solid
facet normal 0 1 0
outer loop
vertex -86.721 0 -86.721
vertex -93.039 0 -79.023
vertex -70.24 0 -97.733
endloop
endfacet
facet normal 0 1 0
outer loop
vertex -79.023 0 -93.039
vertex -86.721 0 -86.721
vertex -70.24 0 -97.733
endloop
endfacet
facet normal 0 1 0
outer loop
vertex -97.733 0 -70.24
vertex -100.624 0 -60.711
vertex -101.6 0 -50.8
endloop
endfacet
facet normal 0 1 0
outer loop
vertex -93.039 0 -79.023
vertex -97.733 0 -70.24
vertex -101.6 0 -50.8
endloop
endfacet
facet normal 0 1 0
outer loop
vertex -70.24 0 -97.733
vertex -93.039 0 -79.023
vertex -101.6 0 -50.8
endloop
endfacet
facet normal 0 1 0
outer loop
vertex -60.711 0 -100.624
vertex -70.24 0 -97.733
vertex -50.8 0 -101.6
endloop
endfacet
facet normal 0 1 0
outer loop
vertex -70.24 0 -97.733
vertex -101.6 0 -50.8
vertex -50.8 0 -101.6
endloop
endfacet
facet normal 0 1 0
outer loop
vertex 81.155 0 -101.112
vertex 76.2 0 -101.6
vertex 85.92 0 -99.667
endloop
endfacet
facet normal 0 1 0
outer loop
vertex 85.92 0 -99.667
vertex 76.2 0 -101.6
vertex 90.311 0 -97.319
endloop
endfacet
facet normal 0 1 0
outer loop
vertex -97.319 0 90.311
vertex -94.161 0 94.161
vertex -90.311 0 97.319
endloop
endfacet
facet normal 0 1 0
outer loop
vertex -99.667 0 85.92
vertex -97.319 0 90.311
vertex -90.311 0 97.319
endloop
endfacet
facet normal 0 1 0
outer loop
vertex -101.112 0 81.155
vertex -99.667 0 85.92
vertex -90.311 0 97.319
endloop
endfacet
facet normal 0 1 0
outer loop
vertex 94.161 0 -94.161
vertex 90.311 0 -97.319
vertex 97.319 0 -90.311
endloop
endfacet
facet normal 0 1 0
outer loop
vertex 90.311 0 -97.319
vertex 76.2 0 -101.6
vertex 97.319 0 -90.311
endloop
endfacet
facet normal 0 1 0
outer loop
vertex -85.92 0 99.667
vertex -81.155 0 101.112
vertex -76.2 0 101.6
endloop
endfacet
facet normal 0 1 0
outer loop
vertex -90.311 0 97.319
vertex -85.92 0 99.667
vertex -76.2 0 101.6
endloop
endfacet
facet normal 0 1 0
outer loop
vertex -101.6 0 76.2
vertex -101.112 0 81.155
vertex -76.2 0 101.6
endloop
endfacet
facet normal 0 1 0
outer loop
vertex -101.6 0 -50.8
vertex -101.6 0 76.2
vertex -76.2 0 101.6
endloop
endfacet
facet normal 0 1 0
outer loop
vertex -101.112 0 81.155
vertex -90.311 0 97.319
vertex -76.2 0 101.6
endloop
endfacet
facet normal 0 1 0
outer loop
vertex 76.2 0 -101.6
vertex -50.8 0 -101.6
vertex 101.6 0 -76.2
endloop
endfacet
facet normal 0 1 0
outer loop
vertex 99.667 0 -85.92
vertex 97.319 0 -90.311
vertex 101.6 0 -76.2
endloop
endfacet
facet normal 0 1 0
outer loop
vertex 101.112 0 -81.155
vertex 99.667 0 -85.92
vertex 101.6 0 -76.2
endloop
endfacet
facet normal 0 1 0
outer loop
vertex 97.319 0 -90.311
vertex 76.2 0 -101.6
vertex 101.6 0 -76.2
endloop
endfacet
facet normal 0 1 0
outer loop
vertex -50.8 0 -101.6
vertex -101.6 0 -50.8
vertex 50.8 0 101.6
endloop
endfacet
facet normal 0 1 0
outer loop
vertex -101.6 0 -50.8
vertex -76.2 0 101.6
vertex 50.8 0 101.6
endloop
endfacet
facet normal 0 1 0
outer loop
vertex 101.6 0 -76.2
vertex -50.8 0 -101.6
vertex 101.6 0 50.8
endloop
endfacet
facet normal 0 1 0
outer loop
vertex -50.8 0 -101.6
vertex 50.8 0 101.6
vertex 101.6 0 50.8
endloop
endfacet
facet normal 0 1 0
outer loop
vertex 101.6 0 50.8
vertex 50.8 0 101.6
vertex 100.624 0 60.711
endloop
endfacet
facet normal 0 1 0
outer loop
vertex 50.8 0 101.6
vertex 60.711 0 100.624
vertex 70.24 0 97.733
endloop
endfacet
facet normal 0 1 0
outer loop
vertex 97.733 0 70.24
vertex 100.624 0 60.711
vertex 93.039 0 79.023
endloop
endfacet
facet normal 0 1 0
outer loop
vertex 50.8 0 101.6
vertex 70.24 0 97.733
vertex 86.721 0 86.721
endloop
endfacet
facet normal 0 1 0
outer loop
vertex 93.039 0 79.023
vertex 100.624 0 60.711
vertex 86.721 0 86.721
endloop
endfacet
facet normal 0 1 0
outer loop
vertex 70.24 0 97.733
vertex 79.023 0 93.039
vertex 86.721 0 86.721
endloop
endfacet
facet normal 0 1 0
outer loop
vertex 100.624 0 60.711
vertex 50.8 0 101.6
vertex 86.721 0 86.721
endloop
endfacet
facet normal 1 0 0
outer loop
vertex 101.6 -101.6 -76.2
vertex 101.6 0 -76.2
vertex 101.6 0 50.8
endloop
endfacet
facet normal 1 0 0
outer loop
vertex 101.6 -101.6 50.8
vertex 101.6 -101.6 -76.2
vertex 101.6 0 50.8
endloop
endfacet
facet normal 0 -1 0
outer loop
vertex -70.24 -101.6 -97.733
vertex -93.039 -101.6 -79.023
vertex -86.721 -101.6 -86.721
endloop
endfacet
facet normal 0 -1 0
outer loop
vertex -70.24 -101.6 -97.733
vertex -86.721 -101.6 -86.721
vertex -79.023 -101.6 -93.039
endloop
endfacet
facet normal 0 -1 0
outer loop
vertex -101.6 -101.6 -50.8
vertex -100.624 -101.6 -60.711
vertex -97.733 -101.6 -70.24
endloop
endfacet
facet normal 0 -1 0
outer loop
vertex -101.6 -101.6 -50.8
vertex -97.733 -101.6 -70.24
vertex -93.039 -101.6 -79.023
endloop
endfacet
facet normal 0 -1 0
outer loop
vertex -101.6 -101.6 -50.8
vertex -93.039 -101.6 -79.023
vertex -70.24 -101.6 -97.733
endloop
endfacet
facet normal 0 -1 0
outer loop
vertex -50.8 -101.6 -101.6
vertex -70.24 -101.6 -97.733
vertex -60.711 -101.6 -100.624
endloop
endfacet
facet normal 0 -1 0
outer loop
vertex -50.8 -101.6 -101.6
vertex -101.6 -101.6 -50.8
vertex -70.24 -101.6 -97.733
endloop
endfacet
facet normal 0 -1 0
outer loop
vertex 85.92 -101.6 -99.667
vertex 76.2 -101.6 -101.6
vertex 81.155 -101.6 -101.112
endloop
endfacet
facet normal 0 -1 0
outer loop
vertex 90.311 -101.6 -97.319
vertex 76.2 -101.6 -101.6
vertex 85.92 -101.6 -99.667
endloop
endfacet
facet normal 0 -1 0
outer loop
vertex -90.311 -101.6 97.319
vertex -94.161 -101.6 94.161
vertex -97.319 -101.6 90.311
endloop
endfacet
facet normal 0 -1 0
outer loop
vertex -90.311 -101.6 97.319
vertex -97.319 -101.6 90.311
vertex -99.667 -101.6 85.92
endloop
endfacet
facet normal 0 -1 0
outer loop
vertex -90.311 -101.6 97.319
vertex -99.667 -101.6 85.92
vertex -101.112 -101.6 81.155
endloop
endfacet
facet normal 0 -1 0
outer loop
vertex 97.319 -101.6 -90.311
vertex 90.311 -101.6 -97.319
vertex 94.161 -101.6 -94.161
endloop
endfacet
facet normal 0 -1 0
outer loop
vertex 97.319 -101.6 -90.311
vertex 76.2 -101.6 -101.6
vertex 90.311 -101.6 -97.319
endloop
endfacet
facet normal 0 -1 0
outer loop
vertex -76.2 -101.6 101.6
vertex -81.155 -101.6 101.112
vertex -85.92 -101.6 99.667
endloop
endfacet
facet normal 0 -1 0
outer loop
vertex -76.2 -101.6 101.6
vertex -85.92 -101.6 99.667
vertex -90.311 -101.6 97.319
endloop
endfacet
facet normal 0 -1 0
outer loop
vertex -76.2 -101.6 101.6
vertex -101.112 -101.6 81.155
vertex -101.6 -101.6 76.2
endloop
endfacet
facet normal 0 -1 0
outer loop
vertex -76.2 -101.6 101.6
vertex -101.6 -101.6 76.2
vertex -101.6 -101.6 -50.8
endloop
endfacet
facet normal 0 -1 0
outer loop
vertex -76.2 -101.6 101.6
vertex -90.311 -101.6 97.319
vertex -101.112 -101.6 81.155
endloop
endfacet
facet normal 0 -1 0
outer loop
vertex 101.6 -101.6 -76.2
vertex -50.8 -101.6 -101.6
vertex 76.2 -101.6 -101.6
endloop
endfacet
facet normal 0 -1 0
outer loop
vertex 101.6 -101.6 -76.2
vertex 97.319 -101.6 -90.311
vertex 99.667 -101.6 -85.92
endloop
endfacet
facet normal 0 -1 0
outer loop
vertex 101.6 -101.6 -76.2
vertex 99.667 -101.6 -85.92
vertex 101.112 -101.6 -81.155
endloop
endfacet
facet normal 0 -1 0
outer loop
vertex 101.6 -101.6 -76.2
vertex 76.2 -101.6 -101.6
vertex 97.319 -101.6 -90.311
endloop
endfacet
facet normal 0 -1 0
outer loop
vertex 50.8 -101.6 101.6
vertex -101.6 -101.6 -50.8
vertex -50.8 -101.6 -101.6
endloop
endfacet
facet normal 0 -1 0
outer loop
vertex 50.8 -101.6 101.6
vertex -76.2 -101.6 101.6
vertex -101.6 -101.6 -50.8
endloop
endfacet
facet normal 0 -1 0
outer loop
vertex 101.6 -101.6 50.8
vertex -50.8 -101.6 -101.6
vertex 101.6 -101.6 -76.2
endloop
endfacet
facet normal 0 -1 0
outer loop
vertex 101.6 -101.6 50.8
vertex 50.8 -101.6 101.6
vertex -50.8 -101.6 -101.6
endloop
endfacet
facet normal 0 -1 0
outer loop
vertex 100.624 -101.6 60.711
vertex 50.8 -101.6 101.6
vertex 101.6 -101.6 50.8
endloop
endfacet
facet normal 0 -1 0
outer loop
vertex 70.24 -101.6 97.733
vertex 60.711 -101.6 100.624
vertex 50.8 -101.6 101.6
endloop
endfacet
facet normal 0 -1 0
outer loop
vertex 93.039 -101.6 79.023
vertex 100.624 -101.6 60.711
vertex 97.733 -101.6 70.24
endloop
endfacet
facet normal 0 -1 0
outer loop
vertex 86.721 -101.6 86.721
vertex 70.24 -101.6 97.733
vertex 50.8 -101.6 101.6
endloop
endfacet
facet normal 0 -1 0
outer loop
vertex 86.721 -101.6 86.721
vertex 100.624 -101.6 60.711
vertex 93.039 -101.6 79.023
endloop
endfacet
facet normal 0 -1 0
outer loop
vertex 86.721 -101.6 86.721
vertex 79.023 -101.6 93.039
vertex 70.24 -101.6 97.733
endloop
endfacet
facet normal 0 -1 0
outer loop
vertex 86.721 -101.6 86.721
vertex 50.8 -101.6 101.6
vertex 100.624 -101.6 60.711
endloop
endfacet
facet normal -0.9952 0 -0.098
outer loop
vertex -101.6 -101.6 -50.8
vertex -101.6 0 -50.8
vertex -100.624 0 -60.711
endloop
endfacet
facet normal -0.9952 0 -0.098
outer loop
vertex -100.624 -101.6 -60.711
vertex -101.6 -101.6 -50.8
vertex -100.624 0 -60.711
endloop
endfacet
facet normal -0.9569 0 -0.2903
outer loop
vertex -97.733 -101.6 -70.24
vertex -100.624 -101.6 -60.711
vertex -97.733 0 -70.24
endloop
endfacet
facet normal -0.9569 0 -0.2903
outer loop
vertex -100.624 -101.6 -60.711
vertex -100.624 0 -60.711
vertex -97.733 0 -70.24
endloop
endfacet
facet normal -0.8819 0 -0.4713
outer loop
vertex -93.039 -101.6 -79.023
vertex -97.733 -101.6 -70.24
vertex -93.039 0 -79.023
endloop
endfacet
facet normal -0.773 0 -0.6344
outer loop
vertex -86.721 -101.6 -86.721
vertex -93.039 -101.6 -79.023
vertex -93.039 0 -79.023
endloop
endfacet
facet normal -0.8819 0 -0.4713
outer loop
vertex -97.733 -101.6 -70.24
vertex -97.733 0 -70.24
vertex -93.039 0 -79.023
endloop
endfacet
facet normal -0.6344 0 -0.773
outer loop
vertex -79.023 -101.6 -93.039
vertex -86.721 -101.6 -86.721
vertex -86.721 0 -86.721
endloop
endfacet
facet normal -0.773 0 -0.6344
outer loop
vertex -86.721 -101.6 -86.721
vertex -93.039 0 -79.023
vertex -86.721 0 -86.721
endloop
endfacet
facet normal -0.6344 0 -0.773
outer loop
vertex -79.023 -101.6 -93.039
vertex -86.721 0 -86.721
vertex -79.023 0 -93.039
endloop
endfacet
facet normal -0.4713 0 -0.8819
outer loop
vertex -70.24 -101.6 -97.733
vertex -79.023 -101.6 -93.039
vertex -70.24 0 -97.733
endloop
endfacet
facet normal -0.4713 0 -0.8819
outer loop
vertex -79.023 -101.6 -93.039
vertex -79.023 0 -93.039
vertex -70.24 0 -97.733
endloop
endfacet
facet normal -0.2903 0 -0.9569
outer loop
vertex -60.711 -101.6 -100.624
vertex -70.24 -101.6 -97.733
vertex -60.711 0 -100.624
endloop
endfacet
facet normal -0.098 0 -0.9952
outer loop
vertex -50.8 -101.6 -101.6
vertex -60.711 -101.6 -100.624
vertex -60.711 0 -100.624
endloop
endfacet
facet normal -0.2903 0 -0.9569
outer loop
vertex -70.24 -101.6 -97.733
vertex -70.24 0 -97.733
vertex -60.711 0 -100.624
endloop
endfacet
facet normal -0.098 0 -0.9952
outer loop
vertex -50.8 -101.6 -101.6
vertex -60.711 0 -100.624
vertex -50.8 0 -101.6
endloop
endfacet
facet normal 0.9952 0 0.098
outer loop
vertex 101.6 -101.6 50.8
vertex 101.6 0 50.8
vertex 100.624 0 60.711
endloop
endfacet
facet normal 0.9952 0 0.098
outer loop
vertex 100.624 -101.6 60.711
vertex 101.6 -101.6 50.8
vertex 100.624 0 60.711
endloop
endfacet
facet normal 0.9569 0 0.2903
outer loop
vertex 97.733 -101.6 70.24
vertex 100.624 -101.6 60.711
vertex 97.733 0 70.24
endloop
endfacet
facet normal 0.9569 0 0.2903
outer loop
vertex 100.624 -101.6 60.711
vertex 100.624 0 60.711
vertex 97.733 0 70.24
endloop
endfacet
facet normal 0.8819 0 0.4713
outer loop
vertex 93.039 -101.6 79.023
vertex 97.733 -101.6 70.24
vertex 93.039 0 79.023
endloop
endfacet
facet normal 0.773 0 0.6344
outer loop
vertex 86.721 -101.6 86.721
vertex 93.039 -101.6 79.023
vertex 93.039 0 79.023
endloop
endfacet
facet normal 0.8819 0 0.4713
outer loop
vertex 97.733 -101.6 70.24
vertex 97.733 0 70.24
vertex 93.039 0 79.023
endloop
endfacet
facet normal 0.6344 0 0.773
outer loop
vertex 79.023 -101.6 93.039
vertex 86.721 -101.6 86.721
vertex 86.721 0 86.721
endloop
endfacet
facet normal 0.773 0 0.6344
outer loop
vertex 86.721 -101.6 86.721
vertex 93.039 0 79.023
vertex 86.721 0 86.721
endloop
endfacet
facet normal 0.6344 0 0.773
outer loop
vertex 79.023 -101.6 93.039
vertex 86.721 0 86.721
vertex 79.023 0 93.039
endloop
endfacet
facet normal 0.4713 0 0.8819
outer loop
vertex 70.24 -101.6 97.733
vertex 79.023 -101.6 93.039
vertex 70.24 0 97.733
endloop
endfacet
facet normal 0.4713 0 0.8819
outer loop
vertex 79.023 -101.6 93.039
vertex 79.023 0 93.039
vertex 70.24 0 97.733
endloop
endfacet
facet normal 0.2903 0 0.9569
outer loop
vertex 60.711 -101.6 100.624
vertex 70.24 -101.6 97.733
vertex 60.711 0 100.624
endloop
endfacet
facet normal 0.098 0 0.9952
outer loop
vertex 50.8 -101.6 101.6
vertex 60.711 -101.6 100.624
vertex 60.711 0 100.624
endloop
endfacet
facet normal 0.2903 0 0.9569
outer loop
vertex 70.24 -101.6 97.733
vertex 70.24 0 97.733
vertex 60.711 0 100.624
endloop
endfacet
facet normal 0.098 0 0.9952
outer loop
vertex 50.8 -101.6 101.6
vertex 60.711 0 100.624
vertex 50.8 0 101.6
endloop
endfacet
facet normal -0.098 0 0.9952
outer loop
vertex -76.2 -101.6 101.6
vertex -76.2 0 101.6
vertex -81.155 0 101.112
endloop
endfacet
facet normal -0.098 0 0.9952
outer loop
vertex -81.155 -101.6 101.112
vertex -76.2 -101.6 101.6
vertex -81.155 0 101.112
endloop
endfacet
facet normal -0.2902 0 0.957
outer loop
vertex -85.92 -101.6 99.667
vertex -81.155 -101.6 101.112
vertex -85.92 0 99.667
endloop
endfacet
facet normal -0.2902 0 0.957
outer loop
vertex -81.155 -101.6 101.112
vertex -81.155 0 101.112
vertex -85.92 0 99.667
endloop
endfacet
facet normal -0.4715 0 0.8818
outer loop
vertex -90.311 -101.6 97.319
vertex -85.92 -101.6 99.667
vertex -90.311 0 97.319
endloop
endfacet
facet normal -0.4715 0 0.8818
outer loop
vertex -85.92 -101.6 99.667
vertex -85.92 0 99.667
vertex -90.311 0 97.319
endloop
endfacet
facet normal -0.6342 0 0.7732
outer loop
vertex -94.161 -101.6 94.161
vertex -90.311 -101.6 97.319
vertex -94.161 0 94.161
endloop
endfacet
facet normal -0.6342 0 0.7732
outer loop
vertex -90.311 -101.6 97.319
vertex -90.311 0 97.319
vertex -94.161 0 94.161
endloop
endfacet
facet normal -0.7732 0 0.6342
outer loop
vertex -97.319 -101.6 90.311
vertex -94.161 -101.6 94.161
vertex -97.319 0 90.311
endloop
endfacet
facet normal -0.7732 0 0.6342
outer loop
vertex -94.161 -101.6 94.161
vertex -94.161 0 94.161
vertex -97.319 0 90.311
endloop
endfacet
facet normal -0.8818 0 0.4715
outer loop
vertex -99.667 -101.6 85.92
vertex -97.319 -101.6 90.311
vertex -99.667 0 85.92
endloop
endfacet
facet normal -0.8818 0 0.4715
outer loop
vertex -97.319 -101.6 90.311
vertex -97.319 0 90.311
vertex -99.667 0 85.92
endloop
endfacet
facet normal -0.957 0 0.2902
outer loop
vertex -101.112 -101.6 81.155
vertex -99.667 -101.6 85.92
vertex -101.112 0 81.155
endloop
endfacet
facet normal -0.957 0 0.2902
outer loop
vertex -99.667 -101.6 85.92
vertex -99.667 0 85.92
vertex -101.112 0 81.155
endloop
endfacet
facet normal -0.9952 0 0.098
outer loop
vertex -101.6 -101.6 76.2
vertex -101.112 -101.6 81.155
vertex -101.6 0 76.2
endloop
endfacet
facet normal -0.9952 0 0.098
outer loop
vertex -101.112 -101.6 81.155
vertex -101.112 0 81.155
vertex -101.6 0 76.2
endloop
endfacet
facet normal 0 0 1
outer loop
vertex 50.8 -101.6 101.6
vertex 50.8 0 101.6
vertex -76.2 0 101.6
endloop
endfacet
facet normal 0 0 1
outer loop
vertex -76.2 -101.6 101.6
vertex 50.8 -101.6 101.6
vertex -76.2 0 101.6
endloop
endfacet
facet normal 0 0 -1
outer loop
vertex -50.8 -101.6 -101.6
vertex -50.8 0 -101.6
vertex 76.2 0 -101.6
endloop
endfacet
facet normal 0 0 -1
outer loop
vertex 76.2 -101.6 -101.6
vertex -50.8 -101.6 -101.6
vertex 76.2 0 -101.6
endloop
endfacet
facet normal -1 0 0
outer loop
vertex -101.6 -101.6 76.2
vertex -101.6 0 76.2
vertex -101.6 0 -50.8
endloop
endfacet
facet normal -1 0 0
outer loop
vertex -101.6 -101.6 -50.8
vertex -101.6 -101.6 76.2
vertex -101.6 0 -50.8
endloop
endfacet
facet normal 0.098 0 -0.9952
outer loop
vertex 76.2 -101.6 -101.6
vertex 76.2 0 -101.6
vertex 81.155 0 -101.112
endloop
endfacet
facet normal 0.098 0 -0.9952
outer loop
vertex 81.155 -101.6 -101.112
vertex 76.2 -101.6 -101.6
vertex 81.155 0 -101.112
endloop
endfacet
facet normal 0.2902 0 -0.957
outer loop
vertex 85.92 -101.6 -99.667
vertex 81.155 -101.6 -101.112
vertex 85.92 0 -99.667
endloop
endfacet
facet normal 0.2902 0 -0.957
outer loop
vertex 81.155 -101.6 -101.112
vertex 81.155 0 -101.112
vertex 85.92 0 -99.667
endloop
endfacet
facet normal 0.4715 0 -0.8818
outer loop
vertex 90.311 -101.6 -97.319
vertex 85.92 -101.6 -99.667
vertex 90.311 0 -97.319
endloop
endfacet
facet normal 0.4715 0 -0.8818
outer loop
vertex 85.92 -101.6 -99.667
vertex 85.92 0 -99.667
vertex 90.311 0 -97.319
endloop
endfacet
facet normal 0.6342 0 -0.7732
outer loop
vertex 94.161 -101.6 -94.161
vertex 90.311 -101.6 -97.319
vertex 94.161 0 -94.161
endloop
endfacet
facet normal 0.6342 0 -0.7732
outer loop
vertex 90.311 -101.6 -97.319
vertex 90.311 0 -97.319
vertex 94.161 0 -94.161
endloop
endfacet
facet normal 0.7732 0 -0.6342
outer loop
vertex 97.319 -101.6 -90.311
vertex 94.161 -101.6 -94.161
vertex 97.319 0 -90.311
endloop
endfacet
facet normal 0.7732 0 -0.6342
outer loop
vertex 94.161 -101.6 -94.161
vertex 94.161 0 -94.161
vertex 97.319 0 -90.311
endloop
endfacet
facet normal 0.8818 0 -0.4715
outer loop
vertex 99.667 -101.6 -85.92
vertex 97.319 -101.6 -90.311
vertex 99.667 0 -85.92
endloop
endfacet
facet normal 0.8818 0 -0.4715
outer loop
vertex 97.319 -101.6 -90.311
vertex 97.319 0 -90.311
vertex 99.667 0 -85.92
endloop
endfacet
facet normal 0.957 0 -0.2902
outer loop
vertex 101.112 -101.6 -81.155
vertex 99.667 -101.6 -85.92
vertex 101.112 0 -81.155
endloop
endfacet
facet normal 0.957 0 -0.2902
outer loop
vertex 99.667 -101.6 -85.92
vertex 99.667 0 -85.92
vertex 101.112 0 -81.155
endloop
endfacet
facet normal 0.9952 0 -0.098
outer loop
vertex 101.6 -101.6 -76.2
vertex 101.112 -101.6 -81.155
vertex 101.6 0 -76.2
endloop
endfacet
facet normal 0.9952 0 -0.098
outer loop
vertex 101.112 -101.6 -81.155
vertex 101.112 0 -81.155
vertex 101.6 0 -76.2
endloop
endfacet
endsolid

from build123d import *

# Parameters (mm, degrees)
F1_DEPTH = 101.6


with BuildPart() as f1:
    # F0 (on Front) → F1 (new body)
    with BuildSketch(Plane.XZ):
        with BuildLine():
            Line((50.8, 101.6), (-76.2, 101.6))
            ThreePointArc((-76.2, 101.6), (-94.160512, 94.160512), (-101.6, 76.2))
            Line((-101.6, 76.2), (-101.6, -50.8))
            ThreePointArc((-101.6, -50.8), (-86.721024, -86.721024), (-50.8, -101.6))
            Line((-50.8, -101.6), (76.2, -101.6))
            ThreePointArc((76.2, -101.6), (94.160512, -94.160512), (101.6, -76.2))
            Line((101.6, -76.2), (101.6, 50.8))
            ThreePointArc((101.6, 50.8), (86.721024, 86.721024), (50.8, 101.6))
        make_face()
    extrude(amount=F1_DEPTH)


solid = f1.part
